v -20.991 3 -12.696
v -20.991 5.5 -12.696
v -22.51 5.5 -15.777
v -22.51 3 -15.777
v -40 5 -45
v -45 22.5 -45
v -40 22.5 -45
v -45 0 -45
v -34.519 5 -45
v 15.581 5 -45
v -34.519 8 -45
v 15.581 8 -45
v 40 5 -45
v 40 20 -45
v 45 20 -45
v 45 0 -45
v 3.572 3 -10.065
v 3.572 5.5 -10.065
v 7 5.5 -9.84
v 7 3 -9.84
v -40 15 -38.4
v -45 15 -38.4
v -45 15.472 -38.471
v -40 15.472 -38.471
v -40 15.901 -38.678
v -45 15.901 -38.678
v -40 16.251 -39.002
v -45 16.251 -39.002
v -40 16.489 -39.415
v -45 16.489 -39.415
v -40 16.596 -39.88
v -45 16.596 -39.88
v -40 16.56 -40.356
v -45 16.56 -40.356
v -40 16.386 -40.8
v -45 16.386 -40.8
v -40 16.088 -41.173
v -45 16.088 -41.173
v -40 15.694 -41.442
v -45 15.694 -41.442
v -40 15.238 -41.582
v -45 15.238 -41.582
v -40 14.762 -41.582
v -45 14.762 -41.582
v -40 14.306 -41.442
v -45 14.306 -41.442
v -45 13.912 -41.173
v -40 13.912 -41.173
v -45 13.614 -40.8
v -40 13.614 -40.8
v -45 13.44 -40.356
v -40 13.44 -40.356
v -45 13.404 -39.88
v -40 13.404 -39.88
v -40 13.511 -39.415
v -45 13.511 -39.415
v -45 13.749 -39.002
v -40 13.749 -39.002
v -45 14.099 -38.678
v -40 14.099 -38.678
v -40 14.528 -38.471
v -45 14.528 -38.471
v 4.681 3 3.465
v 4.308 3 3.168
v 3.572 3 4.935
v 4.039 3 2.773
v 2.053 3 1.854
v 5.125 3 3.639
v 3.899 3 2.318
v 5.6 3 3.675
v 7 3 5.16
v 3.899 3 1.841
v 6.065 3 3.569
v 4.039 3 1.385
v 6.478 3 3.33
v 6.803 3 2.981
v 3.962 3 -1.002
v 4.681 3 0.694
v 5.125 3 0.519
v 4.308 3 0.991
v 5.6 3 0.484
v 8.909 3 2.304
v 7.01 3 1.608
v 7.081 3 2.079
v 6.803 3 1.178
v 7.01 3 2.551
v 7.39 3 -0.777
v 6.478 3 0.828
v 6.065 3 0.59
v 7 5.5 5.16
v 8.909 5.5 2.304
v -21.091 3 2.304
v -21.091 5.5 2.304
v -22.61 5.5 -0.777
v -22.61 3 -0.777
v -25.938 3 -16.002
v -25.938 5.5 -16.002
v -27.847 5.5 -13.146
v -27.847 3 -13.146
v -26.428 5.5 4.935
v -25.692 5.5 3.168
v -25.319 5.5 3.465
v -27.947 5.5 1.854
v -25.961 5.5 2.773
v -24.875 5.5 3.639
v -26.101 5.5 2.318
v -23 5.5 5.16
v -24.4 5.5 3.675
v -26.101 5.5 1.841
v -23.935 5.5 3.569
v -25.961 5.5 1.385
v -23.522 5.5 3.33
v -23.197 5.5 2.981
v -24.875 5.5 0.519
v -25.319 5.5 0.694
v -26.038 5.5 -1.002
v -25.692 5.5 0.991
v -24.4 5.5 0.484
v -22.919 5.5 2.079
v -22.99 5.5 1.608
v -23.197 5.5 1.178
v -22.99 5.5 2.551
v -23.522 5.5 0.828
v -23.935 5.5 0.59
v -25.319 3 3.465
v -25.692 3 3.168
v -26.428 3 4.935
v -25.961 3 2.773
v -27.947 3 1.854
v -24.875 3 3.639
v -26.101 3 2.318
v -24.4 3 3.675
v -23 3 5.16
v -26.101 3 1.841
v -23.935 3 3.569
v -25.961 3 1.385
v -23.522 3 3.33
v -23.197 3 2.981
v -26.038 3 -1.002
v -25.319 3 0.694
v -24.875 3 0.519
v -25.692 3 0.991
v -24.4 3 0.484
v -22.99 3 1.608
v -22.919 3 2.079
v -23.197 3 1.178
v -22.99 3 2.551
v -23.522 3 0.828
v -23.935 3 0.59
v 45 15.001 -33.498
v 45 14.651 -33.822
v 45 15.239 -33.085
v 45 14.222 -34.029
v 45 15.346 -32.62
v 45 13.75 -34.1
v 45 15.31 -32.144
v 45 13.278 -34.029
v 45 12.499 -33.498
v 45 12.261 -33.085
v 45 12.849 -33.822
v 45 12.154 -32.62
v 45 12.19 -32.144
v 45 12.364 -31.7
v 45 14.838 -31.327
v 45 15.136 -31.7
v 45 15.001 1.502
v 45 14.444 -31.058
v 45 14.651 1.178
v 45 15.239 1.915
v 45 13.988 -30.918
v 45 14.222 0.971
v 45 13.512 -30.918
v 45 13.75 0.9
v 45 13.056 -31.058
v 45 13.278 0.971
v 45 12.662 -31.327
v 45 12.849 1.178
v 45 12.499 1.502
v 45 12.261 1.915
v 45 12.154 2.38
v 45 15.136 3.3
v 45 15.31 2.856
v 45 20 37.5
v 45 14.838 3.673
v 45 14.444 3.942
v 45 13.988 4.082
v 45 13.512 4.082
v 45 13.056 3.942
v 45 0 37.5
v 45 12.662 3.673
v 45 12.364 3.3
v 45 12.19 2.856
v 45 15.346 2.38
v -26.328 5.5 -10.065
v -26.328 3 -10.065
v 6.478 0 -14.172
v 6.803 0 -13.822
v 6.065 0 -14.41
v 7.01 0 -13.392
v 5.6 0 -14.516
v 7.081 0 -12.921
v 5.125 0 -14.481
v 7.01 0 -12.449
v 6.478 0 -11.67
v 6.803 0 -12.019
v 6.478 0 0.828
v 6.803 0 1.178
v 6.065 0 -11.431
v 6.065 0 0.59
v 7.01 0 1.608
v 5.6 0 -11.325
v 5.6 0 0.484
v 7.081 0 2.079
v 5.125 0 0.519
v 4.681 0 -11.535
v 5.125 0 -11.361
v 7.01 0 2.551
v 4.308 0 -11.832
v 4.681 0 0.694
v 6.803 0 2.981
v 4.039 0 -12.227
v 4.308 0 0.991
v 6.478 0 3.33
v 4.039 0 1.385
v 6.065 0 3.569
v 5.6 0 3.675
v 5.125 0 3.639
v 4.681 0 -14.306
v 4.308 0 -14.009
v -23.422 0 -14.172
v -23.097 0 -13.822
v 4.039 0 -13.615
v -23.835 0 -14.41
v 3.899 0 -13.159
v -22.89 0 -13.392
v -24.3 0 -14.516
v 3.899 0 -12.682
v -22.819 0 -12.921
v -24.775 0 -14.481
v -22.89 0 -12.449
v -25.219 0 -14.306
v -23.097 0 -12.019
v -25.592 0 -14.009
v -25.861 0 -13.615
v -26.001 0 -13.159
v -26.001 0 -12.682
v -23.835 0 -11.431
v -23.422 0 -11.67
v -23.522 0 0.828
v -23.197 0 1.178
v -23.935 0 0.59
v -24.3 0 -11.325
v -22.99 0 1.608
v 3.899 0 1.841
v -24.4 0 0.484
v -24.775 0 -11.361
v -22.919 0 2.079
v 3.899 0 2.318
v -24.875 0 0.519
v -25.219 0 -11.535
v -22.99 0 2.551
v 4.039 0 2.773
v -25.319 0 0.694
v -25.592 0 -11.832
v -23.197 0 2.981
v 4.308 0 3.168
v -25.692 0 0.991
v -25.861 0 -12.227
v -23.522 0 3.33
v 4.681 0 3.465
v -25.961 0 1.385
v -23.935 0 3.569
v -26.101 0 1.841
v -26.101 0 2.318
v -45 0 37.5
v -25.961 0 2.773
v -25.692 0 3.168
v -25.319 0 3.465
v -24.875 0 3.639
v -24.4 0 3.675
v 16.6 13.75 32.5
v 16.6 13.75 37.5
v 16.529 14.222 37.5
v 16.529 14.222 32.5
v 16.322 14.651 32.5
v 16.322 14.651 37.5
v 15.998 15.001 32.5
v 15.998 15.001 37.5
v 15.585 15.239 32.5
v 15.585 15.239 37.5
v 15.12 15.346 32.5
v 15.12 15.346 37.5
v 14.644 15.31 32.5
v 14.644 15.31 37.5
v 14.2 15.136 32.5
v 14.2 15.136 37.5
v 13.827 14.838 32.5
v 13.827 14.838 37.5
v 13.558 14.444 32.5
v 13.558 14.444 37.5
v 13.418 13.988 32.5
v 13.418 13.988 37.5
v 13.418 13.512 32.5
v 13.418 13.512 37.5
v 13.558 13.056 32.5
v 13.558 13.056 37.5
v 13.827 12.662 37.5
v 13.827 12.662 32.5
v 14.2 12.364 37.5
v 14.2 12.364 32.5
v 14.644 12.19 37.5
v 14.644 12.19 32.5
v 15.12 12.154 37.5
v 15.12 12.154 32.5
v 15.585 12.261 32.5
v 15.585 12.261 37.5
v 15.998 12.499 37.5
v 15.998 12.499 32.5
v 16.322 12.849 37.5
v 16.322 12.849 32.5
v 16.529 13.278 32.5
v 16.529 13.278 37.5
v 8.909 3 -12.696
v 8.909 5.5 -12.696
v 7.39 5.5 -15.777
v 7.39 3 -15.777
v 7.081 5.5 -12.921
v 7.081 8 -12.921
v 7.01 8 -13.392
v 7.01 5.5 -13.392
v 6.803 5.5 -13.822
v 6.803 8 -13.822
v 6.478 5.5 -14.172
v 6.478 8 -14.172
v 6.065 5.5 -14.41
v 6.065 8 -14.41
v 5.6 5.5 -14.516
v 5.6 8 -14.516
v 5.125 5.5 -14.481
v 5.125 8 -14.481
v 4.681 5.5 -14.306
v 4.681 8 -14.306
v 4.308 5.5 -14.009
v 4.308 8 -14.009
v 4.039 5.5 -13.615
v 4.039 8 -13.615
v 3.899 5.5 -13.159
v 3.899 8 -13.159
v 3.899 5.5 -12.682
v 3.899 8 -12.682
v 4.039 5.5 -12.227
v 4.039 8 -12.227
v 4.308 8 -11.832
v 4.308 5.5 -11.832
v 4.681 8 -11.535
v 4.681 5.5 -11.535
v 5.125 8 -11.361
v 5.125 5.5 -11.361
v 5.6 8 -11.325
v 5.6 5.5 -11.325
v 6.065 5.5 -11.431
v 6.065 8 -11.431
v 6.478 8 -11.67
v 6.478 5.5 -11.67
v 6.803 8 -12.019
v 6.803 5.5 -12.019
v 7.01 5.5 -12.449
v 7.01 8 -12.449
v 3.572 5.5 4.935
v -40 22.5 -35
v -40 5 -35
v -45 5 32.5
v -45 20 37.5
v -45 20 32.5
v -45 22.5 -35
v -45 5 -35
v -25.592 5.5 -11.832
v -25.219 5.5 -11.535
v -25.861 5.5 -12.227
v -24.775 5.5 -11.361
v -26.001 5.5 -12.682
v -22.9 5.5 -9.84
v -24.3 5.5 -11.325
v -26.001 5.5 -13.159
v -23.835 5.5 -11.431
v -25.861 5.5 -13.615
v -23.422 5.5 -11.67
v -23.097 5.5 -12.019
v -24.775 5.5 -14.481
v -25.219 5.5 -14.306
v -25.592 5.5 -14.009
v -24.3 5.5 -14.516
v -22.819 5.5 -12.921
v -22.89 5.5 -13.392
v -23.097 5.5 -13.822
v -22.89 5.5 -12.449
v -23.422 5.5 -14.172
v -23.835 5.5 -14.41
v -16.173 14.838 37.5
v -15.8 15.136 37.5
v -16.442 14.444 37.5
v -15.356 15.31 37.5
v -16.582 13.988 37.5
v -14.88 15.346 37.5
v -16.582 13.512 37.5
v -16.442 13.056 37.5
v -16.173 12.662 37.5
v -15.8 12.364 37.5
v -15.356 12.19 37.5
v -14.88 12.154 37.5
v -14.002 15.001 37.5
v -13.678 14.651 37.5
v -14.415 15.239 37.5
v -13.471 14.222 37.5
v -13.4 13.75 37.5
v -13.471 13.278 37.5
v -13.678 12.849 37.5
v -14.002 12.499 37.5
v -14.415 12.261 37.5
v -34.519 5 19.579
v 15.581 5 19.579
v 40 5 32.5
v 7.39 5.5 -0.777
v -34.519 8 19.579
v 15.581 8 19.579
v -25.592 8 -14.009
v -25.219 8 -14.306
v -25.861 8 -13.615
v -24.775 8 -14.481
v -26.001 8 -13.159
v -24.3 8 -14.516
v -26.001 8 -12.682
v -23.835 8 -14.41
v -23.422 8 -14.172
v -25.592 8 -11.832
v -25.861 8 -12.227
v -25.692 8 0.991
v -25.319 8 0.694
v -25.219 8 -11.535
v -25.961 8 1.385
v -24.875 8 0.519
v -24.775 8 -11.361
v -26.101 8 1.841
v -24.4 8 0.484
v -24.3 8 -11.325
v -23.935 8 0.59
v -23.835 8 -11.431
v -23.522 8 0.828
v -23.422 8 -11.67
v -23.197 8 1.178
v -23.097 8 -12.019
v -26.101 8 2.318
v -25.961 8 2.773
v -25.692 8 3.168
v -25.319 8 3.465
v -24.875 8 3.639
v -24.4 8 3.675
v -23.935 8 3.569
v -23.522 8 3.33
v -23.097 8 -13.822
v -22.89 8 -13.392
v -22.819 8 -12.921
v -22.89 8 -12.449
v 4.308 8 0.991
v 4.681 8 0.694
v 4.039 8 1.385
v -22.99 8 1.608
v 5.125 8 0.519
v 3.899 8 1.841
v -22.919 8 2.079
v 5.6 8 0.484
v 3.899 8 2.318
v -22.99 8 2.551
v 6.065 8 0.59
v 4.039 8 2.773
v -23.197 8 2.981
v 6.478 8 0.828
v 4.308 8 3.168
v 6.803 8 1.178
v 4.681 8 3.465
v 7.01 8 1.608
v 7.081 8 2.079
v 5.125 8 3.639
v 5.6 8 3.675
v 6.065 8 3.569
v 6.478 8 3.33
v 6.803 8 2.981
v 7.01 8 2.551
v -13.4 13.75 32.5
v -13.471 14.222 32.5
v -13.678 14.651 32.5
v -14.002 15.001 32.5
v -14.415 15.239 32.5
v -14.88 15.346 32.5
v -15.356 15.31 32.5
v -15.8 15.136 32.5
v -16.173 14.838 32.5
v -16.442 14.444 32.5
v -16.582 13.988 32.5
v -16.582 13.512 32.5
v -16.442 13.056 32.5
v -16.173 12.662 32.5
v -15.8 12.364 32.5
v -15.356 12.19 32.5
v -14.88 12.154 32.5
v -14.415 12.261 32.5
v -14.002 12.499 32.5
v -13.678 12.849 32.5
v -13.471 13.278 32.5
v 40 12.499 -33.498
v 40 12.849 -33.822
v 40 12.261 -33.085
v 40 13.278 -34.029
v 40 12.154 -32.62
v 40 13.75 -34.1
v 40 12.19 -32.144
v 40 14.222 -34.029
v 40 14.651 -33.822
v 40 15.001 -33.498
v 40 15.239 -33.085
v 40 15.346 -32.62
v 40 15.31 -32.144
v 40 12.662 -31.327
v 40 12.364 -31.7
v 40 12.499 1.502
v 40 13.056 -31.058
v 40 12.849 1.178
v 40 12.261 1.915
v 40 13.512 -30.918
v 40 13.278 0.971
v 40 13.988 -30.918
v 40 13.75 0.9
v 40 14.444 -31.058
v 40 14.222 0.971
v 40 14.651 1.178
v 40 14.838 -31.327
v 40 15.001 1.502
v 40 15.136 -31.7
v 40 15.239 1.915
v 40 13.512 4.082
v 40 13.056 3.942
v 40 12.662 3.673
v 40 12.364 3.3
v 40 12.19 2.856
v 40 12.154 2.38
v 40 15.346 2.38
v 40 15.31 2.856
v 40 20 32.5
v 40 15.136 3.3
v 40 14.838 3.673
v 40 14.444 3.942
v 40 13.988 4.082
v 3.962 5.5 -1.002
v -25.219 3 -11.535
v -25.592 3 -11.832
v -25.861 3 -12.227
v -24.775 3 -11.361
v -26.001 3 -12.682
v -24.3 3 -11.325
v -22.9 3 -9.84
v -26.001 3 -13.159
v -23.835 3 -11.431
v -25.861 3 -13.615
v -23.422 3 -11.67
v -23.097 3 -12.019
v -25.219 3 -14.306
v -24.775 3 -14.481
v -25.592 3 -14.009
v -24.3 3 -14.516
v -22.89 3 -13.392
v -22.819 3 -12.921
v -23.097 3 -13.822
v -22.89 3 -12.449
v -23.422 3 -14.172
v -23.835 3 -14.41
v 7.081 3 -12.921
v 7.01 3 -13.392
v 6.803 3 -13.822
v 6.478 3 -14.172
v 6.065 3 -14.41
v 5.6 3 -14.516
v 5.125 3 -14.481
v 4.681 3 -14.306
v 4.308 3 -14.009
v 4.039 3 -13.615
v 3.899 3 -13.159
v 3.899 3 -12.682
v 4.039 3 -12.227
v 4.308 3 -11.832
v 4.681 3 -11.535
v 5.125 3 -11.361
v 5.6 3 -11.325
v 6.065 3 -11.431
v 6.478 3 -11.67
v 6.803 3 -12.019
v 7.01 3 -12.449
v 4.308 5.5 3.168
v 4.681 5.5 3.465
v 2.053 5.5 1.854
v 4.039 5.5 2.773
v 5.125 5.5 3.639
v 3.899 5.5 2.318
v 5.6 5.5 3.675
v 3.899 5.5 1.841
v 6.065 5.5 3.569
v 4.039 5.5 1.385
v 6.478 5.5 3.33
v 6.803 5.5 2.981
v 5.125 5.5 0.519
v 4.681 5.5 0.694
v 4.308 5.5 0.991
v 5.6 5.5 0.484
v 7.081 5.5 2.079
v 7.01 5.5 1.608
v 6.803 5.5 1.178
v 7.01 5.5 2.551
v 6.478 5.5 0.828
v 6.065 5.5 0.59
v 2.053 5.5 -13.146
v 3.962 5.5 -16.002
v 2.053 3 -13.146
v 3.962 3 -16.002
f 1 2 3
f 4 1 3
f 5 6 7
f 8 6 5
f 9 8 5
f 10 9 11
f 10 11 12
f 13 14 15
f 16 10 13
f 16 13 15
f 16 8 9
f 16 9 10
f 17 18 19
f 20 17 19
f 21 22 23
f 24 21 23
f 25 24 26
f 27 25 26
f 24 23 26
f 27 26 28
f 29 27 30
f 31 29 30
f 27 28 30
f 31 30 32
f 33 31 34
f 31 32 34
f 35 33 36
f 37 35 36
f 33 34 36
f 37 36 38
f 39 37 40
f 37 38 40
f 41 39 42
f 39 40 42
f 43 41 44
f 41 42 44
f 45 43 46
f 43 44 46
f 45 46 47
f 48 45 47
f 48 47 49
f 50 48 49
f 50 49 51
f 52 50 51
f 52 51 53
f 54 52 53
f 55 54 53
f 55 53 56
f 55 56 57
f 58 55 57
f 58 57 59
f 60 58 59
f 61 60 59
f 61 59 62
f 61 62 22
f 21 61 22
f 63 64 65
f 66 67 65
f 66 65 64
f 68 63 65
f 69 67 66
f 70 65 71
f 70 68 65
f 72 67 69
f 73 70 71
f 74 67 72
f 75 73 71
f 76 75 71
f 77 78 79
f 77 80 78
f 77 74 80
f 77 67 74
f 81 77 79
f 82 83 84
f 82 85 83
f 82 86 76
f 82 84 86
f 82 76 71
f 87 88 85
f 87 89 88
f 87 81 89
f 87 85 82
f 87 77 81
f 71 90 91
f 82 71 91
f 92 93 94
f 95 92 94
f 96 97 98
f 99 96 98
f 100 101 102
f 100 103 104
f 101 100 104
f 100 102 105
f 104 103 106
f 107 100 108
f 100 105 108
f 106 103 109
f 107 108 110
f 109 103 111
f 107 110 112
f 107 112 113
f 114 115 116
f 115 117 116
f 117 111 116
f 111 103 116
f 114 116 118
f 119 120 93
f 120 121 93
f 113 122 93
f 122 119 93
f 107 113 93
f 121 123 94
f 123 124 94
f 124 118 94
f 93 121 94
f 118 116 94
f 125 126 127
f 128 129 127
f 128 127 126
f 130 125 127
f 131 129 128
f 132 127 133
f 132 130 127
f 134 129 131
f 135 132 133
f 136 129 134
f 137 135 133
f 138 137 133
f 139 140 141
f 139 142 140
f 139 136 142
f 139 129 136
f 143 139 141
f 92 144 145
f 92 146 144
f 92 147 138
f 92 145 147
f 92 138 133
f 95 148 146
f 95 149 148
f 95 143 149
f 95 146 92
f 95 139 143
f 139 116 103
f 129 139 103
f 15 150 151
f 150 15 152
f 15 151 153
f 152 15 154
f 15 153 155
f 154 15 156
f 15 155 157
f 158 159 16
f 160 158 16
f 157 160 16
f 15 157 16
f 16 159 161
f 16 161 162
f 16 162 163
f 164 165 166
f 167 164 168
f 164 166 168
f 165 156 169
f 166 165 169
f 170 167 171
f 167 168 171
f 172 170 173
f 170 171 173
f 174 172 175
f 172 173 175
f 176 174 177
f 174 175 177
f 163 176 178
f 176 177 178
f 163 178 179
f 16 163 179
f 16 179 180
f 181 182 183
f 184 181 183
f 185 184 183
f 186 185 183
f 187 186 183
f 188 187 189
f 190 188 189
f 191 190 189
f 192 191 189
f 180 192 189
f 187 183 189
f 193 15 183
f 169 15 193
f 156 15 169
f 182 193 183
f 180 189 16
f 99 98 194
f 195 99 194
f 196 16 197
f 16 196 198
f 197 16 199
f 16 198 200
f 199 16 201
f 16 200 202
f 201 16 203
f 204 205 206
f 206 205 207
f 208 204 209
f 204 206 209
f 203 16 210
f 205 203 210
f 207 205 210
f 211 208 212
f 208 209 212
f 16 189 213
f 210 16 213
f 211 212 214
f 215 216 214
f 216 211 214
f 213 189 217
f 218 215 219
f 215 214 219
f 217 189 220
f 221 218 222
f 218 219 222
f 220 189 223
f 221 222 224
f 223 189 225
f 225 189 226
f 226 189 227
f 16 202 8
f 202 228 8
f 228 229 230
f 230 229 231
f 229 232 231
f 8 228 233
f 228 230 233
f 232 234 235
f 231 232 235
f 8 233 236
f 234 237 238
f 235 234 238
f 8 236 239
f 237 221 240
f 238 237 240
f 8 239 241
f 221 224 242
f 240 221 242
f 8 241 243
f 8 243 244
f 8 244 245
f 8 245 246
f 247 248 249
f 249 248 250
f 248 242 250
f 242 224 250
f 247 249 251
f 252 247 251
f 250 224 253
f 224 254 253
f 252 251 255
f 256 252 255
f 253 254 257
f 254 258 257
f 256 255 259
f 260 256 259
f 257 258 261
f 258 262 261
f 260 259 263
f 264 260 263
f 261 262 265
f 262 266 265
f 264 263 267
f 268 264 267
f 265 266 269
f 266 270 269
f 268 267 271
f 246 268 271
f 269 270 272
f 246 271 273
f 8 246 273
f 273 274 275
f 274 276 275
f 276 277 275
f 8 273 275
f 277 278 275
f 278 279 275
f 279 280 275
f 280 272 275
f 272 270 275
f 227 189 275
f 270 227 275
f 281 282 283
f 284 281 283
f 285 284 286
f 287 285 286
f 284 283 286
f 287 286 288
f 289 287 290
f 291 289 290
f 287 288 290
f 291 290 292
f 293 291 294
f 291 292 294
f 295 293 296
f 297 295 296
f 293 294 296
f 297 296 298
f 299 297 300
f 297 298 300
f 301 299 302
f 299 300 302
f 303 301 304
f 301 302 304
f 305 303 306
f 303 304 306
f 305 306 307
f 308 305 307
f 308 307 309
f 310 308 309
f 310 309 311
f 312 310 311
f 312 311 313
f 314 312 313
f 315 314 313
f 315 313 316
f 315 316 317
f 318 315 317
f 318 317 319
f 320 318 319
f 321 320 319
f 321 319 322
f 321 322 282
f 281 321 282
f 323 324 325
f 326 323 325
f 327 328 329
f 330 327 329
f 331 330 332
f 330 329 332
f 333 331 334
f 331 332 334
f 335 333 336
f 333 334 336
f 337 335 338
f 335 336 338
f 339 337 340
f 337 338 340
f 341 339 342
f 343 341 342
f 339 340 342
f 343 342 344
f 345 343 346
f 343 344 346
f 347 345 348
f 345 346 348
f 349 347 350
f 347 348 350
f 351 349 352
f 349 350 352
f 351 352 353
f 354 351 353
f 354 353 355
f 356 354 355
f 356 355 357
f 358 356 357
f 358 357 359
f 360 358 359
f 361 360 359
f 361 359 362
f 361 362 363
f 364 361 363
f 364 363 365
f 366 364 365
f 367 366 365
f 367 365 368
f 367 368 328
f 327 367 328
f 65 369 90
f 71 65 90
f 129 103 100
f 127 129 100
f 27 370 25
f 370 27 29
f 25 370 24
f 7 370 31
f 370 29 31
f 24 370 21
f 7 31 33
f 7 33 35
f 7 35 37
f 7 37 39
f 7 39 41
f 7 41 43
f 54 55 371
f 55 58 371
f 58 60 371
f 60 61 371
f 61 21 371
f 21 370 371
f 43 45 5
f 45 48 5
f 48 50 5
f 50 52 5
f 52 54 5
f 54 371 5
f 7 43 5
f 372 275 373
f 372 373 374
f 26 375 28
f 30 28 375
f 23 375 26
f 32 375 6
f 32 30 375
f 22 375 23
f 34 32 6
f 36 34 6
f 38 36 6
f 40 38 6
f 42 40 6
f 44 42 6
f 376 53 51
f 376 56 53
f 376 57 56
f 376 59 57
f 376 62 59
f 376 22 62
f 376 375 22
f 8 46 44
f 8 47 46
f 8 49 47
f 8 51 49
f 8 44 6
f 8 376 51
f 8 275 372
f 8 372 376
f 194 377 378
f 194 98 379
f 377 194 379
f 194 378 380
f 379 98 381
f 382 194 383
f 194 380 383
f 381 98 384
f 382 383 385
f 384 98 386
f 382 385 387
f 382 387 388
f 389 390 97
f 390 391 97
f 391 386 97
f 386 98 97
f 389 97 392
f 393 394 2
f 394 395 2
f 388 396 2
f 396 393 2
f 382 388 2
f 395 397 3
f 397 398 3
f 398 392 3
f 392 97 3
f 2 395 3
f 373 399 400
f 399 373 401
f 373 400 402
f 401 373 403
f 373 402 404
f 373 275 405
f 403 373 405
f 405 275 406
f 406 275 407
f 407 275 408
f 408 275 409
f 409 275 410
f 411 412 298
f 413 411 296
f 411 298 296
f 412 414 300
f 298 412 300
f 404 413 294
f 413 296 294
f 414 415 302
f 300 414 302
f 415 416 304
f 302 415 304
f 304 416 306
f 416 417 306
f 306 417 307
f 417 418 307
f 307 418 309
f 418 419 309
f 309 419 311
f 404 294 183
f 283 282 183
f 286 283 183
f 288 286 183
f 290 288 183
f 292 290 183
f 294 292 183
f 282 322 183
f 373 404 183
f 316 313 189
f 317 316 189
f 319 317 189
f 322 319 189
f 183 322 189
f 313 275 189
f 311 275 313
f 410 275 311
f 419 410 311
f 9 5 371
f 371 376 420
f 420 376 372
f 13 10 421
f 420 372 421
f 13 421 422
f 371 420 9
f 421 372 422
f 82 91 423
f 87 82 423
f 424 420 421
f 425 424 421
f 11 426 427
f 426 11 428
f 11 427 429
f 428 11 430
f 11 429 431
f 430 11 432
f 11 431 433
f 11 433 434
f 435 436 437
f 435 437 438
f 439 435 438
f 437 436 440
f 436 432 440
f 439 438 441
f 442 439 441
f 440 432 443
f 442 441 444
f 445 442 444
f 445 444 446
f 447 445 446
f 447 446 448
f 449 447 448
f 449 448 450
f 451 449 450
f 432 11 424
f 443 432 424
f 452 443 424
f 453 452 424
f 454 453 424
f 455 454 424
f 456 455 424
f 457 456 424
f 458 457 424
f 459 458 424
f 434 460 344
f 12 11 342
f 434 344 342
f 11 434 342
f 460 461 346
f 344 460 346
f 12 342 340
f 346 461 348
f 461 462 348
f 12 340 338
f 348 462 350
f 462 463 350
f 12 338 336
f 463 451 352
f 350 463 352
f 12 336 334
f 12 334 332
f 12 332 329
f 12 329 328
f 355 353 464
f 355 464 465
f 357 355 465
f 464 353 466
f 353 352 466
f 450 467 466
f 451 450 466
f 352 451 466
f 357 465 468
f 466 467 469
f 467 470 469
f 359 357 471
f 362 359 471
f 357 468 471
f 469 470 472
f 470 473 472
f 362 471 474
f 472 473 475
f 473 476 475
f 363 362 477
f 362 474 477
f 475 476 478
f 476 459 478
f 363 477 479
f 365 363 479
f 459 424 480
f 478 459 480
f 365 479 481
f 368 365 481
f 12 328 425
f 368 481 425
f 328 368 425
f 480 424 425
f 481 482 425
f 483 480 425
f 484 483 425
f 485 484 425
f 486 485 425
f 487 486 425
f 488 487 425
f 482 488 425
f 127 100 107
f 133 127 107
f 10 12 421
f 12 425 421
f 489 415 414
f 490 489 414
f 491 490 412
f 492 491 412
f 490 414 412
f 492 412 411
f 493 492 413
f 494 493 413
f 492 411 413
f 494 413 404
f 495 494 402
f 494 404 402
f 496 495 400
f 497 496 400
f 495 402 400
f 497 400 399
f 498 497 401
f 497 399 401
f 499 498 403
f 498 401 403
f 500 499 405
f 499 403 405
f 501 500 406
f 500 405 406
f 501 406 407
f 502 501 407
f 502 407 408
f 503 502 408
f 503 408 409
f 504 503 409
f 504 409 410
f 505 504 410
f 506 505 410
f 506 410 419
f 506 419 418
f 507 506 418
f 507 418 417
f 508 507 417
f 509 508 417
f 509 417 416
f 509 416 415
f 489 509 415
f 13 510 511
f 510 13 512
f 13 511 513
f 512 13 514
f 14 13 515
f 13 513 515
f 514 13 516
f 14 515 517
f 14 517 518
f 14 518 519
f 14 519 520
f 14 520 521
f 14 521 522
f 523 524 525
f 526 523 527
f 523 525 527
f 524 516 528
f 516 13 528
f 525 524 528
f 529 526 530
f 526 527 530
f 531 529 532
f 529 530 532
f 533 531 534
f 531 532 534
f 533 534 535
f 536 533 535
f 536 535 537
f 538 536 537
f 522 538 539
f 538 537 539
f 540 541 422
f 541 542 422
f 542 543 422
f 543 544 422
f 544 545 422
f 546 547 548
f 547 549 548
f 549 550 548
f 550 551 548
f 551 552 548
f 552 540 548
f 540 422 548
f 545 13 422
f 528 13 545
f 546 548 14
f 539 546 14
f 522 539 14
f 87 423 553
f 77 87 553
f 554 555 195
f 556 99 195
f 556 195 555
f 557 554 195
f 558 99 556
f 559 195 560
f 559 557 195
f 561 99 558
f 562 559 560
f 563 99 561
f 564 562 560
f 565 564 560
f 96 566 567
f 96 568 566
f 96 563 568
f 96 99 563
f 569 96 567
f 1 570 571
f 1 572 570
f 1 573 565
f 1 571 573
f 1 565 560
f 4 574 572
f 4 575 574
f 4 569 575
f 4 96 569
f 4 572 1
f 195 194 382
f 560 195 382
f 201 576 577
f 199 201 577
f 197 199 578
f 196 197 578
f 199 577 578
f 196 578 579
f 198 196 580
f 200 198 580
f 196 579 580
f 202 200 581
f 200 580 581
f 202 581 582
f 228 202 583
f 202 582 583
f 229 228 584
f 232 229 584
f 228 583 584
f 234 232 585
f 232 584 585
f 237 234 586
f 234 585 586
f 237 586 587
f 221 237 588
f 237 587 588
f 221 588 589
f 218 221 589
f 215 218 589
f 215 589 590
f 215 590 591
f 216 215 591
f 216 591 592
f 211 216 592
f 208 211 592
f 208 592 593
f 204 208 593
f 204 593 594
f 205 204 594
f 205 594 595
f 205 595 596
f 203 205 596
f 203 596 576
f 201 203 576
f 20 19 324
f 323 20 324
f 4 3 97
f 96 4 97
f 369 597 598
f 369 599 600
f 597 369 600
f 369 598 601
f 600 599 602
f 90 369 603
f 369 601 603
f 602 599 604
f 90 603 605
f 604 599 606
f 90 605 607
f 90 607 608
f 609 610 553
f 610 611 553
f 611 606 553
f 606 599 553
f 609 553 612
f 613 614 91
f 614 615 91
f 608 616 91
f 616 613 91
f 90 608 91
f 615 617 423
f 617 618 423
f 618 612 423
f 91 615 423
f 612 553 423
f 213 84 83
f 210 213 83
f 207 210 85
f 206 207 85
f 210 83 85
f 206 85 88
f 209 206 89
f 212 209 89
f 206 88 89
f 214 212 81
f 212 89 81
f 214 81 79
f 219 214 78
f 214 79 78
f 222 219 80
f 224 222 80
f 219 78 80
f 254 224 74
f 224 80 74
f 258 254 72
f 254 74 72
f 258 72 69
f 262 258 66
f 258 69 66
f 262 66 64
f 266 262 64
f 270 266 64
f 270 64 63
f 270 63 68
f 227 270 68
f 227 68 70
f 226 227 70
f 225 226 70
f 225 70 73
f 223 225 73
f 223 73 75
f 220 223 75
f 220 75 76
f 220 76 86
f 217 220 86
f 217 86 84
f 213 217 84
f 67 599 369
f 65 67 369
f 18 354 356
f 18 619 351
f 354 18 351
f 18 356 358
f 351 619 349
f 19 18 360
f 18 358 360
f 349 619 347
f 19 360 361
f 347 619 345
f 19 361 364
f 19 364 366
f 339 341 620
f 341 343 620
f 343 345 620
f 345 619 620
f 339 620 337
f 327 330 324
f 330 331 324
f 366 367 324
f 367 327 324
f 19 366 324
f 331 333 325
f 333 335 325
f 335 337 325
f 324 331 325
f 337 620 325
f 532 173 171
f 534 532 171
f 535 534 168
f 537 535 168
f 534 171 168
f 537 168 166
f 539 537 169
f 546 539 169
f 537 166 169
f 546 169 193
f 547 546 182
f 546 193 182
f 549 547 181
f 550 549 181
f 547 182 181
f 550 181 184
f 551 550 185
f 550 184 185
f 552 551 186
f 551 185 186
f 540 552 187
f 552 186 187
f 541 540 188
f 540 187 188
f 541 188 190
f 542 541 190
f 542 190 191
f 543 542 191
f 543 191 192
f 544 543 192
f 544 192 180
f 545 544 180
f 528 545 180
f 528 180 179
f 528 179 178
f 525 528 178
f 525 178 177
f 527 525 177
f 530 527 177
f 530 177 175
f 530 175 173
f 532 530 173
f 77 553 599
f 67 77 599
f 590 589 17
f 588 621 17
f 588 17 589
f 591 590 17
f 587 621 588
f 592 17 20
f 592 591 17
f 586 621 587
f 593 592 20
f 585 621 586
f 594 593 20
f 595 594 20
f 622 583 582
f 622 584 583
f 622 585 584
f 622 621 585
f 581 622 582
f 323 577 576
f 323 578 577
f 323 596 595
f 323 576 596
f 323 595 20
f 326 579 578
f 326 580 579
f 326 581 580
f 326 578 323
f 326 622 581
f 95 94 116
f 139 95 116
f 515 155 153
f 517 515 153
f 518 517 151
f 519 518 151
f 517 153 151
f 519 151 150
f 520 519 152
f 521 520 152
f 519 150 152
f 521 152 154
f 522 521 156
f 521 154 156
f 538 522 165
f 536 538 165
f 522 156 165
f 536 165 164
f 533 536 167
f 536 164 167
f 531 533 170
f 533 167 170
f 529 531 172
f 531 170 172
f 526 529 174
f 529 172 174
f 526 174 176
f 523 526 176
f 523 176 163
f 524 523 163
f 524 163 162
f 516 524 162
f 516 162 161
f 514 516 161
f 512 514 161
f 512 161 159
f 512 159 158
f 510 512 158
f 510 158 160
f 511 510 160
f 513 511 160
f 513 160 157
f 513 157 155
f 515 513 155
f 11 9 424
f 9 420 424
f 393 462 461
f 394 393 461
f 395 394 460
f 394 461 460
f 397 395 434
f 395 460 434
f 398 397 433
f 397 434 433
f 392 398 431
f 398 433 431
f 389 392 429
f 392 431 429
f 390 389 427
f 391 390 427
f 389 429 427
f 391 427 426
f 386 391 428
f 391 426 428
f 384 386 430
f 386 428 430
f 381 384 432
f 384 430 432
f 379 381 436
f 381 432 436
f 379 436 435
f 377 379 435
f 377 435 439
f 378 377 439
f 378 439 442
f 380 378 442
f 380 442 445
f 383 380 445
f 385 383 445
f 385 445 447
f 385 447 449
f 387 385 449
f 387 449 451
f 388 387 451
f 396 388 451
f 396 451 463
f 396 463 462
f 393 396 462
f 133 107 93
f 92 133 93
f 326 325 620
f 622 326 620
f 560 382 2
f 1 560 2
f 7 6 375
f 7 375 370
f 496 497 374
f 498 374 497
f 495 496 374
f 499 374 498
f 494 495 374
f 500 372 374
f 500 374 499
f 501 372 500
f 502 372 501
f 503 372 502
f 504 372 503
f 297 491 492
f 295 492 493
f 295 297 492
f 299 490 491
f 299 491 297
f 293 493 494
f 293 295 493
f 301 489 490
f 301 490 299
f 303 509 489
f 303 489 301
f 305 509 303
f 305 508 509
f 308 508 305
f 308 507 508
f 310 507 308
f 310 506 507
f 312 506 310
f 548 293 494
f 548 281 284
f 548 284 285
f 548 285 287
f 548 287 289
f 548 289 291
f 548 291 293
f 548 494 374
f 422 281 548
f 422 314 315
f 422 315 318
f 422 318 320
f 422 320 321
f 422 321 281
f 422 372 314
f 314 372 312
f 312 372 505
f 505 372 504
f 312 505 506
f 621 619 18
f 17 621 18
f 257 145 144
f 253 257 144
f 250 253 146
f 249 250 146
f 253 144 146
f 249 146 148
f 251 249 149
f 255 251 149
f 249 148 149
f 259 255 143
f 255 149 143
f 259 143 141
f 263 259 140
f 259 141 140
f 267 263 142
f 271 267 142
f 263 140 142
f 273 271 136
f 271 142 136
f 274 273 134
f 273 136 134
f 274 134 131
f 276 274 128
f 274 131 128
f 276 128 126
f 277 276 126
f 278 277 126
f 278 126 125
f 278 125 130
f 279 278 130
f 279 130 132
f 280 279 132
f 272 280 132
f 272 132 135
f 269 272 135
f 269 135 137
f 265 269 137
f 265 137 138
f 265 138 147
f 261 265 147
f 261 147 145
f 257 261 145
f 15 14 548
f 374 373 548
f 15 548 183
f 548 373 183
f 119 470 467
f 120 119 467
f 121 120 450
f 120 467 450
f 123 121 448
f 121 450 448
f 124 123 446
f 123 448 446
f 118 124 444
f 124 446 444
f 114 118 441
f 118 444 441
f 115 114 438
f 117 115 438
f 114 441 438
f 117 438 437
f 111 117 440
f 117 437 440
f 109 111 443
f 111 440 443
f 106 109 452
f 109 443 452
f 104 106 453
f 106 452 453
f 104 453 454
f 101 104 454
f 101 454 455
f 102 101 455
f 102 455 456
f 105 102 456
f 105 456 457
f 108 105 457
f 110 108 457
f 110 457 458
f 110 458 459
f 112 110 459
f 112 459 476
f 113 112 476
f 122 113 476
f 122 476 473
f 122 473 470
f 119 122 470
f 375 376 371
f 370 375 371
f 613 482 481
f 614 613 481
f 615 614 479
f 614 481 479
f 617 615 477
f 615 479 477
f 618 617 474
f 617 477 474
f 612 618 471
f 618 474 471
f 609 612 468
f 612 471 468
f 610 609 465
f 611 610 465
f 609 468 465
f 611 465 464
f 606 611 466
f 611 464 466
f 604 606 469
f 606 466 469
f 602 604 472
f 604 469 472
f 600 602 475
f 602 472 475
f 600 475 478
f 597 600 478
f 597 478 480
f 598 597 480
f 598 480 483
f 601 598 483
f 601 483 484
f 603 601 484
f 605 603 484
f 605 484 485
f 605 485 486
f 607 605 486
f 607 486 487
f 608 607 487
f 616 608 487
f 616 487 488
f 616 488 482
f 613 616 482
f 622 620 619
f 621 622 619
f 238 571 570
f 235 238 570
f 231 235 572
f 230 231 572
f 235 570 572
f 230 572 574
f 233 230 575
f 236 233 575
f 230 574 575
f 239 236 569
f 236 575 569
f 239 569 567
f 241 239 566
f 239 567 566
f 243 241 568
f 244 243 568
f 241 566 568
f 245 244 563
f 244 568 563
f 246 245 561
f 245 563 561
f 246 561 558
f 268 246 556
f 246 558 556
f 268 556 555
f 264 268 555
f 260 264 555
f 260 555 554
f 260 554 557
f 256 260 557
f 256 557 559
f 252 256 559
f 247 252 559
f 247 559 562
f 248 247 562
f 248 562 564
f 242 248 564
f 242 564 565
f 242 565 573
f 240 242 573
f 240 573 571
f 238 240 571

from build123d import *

# Parameters (mm, degrees)
SKETCH1_W           = 90
SKETCH1_H           = 75
BOSS_EXTRUDE1_DEPTH = 5
SKETCH2_W           = 90
SKETCH2_H           = 5
BOSS_EXTRUDE2_DEPTH = 15
SKETCH3_W           = 5
SKETCH3_H           = 15
BOSS_EXTRUDE3_DEPTH = 70
CUT_EXTRUDE1_REACH  = 92
SKETCH5_R           = 1.6
CUT_EXTRUDE3_REACH  = 77
SKETCH7_R           = 1.6
SKETCH8_W           = 50.1
SKETCH8_H           = 57.079275331
BOSS_EXTRUDE6_DEPTH = 3
CUT_EXTRUDE4_REACH  = 10
SKETCH9_R           = 1.6
CUT_EXTRUDE5_START  = -2.5
CUT_EXTRUDE5_DEPTH  = 2.5
BOSS_EXTRUDE7_DEPTH = 7.5
SKETCH12_W          = 5
SKETCH12_H          = 10
BOSS_EXTRUDE8_DEPTH = 17.5
CUT_EXTRUDE6_REACH  = 92
SKETCH13_R          = 1.6


with BuildPart() as part:
    # Sketch1 → Boss-Extrude1 (new body)
    with BuildSketch(Plane(origin=(0, 0, 0), x_dir=(1, 0, 0), z_dir=(0, 1, 0))):
        Rectangle(SKETCH1_W, SKETCH1_H)
    extrude(amount=BOSS_EXTRUDE1_DEPTH)

    # Sketch2 → Boss-Extrude2 (add)
    with BuildSketch(Plane(origin=(0, 5, 0), x_dir=(1, 0, 0), z_dir=(0, 1, 0))):
        with Locations((0, -35)):
            Rectangle(SKETCH2_W, SKETCH2_H)
    extrude(amount=BOSS_EXTRUDE2_DEPTH)

    # Sketch3 → Boss-Extrude3 (add)
    with BuildSketch(Plane(origin=(0, 0, 32.5), x_dir=(-1, 0, 0), z_dir=(0, 0, -1))):
        with Locations((-42.5, 12.5)):
            Rectangle(SKETCH3_W, SKETCH3_H)
    extrude(amount=BOSS_EXTRUDE3_DEPTH)

    # Sketch5 → Cut-Extrude1 (cut, up to next)
    with BuildSketch(Plane(origin=(45, 0, 0), x_dir=(0, 0, -1), z_dir=(1, 0, 0)), mode=Mode.PRIVATE) as cut_extrude1_sk1:
        with Locations((-2.5, 13.75)):
            Circle(SKETCH5_R)
    cut_extrude1_tool1 = extrude(cut_extrude1_sk1.sketch, amount=-CUT_EXTRUDE1_REACH, mode=Mode.PRIVATE) & part.part
    add(cut_extrude1_tool1.solids().sort_by_distance((45, 13.75, 2.5))[0], mode=Mode.SUBTRACT)
    # Sketch5 → Cut-Extrude1 (cut, up to next)
    with BuildSketch(Plane(origin=(45, 0, 0), x_dir=(0, 0, -1), z_dir=(1, 0, 0)), mode=Mode.PRIVATE) as cut_extrude1_sk2:
        with Locations((32.5, 13.75)):
            Circle(SKETCH5_R)
    cut_extrude1_tool2 = extrude(cut_extrude1_sk2.sketch, amount=-CUT_EXTRUDE1_REACH, mode=Mode.PRIVATE) & part.part
    add(cut_extrude1_tool2.solids().sort_by_distance((45, 13.75, -32.5))[0], mode=Mode.SUBTRACT)

    # Sketch7 → Cut-Extrude3 (cut, up to next)
    with BuildSketch(Plane.XY.offset(37.5), mode=Mode.PRIVATE) as cut_extrude3_sk1:
        with Locations((-15, 13.75)):
            Circle(SKETCH7_R)
    cut_extrude3_tool1 = extrude(cut_extrude3_sk1.sketch, amount=-CUT_EXTRUDE3_REACH, mode=Mode.PRIVATE) & part.part
    add(cut_extrude3_tool1.solids().sort_by_distance((-15, 13.75, 37.5))[0], mode=Mode.SUBTRACT)
    # Sketch7 → Cut-Extrude3 (cut, up to next)
    with BuildSketch(Plane.XY.offset(37.5), mode=Mode.PRIVATE) as cut_extrude3_sk2:
        with Locations((15, 13.75)):
            Circle(SKETCH7_R)
    cut_extrude3_tool2 = extrude(cut_extrude3_sk2.sketch, amount=-CUT_EXTRUDE3_REACH, mode=Mode.PRIVATE) & part.part
    add(cut_extrude3_tool2.solids().sort_by_distance((15, 13.75, 37.5))[0], mode=Mode.SUBTRACT)

    # Sketch8 → Boss-Extrude6 (add)
    with BuildSketch(Plane(origin=(0, 5, 0), x_dir=(1, 0, 0), z_dir=(0, 1, 0))):
        with Locations((-9.469239884, 8.960362334)):
            Rectangle(SKETCH8_W, SKETCH8_H)
    extrude(amount=BOSS_EXTRUDE6_DEPTH)

    # Sketch9 → Cut-Extrude4 (cut, up to next)
    with BuildSketch(Plane(origin=(0, 8, 0), x_dir=(1, 0, 0), z_dir=(0, 1, 0)), mode=Mode.PRIVATE) as cut_extrude4_sk1:
        with Locations((-24.419239884, 12.920724669)):
            Circle(SKETCH9_R)
    cut_extrude4_tool1 = extrude(cut_extrude4_sk1.sketch, amount=-CUT_EXTRUDE4_REACH, mode=Mode.PRIVATE) & part.part
    add(cut_extrude4_tool1.solids().sort_by_distance((-24.41924, 8, -12.920725))[0], mode=Mode.SUBTRACT)
    # Sketch9 → Cut-Extrude4 (cut, up to next)
    with BuildSketch(Plane(origin=(0, 8, 0), x_dir=(1, 0, 0), z_dir=(0, 1, 0)), mode=Mode.PRIVATE) as cut_extrude4_sk2:
        with Locations((5.480760116, 12.920724669)):
            Circle(SKETCH9_R)
    cut_extrude4_tool2 = extrude(cut_extrude4_sk2.sketch, amount=-CUT_EXTRUDE4_REACH, mode=Mode.PRIVATE) & part.part
    add(cut_extrude4_tool2.solids().sort_by_distance((5.48076, 8, -12.920725))[0], mode=Mode.SUBTRACT)
    # Sketch9 → Cut-Extrude4 (cut, up to next)
    with BuildSketch(Plane(origin=(0, 8, 0), x_dir=(1, 0, 0), z_dir=(0, 1, 0)), mode=Mode.PRIVATE) as cut_extrude4_sk3:
        with Locations((5.480760116, -2.079275331)):
            Circle(SKETCH9_R)
    cut_extrude4_tool3 = extrude(cut_extrude4_sk3.sketch, amount=-CUT_EXTRUDE4_REACH, mode=Mode.PRIVATE) & part.part
    add(cut_extrude4_tool3.solids().sort_by_distance((5.48076, 8, 2.079275))[0], mode=Mode.SUBTRACT)
    # Sketch9 → Cut-Extrude4 (cut, up to next)
    with BuildSketch(Plane(origin=(0, 8, 0), x_dir=(1, 0, 0), z_dir=(0, 1, 0)), mode=Mode.PRIVATE) as cut_extrude4_sk4:
        with Locations((-24.519239884, -2.079275331)):
            Circle(SKETCH9_R)
    cut_extrude4_tool4 = extrude(cut_extrude4_sk4.sketch, amount=-CUT_EXTRUDE4_REACH, mode=Mode.PRIVATE) & part.part
    add(cut_extrude4_tool4.solids().sort_by_distance((-24.51924, 8, 2.079275))[0], mode=Mode.SUBTRACT)

    # Sketch10 → Cut-Extrude5 (cut)
    with BuildSketch(Plane(origin=(0, 8, 0), x_dir=(1, 0, 0), z_dir=(0, 1, 0)).offset(CUT_EXTRUDE5_START)):
        Polygon((-21.091380421, -2.304248294), (-22.61047785, 0.776851563), (-26.038337313, 1.001824527), (-27.947099347, -1.854302367), (-26.428001917, -4.935402224), (-23.000142454, -5.160375188), align=None)
        Polygon((8.908619579, -2.304248294), (7.38952215, 0.776851563), (3.961662687, 1.001824527), (2.052900653, -1.854302367), (3.571998083, -4.935402224), (6.999857546, -5.160375188), align=None)
        Polygon((8.908619579, 12.695751706), (7.38952215, 15.776851563), (3.961662687, 16.001824527), (2.052900653, 13.145697633), (3.571998083, 10.064597776), (6.999857546, 9.839624812), align=None)
        Polygon((-20.991380369, 12.695752494), (-22.510478507, 15.776852002), (-25.938338022, 16.001824178), (-27.847099399, 13.145696845), (-26.328001261, 10.064597337), (-22.900141746, 9.839625161), align=None)
    extrude(amount=-CUT_EXTRUDE5_DEPTH, mode=Mode.SUBTRACT)

    # Sketch11 → Boss-Extrude7 (add)
    with BuildSketch(Plane(origin=(0, 0, -37.5), x_dir=(-1, 0, 0), z_dir=(0, 0, -1))):
        Polygon((-45, 20), (-45, 0), (45, 0), (45, 5), (34.519239884, 5), (34.519239884, 8), (-15.580760116, 8), (-15.580760116, 5), (-40, 5), (-40, 20), align=None)
    extrude(amount=BOSS_EXTRUDE7_DEPTH)

    # Sketch12 → Boss-Extrude8 (add)
    with BuildSketch(Plane(origin=(0, 5, 0), x_dir=(1, 0, 0), z_dir=(0, 1, 0))):
        with Locations((-42.5, 40)):
            Rectangle(SKETCH12_W, SKETCH12_H)
    extrude(amount=BOSS_EXTRUDE8_DEPTH)

    # Sketch13 → Cut-Extrude6 (cut, up to next)
    with BuildSketch(Plane.ZY.offset(45), mode=Mode.PRIVATE) as cut_extrude6_sk1:
        with Locations((-40, 15)):
            Circle(SKETCH13_R)
    cut_extrude6_tool1 = extrude(cut_extrude6_sk1.sketch, amount=-CUT_EXTRUDE6_REACH, mode=Mode.PRIVATE) & part.part
    add(cut_extrude6_tool1.solids().sort_by_distance((-45, 15, -40))[0], mode=Mode.SUBTRACT)


solid = part.part
